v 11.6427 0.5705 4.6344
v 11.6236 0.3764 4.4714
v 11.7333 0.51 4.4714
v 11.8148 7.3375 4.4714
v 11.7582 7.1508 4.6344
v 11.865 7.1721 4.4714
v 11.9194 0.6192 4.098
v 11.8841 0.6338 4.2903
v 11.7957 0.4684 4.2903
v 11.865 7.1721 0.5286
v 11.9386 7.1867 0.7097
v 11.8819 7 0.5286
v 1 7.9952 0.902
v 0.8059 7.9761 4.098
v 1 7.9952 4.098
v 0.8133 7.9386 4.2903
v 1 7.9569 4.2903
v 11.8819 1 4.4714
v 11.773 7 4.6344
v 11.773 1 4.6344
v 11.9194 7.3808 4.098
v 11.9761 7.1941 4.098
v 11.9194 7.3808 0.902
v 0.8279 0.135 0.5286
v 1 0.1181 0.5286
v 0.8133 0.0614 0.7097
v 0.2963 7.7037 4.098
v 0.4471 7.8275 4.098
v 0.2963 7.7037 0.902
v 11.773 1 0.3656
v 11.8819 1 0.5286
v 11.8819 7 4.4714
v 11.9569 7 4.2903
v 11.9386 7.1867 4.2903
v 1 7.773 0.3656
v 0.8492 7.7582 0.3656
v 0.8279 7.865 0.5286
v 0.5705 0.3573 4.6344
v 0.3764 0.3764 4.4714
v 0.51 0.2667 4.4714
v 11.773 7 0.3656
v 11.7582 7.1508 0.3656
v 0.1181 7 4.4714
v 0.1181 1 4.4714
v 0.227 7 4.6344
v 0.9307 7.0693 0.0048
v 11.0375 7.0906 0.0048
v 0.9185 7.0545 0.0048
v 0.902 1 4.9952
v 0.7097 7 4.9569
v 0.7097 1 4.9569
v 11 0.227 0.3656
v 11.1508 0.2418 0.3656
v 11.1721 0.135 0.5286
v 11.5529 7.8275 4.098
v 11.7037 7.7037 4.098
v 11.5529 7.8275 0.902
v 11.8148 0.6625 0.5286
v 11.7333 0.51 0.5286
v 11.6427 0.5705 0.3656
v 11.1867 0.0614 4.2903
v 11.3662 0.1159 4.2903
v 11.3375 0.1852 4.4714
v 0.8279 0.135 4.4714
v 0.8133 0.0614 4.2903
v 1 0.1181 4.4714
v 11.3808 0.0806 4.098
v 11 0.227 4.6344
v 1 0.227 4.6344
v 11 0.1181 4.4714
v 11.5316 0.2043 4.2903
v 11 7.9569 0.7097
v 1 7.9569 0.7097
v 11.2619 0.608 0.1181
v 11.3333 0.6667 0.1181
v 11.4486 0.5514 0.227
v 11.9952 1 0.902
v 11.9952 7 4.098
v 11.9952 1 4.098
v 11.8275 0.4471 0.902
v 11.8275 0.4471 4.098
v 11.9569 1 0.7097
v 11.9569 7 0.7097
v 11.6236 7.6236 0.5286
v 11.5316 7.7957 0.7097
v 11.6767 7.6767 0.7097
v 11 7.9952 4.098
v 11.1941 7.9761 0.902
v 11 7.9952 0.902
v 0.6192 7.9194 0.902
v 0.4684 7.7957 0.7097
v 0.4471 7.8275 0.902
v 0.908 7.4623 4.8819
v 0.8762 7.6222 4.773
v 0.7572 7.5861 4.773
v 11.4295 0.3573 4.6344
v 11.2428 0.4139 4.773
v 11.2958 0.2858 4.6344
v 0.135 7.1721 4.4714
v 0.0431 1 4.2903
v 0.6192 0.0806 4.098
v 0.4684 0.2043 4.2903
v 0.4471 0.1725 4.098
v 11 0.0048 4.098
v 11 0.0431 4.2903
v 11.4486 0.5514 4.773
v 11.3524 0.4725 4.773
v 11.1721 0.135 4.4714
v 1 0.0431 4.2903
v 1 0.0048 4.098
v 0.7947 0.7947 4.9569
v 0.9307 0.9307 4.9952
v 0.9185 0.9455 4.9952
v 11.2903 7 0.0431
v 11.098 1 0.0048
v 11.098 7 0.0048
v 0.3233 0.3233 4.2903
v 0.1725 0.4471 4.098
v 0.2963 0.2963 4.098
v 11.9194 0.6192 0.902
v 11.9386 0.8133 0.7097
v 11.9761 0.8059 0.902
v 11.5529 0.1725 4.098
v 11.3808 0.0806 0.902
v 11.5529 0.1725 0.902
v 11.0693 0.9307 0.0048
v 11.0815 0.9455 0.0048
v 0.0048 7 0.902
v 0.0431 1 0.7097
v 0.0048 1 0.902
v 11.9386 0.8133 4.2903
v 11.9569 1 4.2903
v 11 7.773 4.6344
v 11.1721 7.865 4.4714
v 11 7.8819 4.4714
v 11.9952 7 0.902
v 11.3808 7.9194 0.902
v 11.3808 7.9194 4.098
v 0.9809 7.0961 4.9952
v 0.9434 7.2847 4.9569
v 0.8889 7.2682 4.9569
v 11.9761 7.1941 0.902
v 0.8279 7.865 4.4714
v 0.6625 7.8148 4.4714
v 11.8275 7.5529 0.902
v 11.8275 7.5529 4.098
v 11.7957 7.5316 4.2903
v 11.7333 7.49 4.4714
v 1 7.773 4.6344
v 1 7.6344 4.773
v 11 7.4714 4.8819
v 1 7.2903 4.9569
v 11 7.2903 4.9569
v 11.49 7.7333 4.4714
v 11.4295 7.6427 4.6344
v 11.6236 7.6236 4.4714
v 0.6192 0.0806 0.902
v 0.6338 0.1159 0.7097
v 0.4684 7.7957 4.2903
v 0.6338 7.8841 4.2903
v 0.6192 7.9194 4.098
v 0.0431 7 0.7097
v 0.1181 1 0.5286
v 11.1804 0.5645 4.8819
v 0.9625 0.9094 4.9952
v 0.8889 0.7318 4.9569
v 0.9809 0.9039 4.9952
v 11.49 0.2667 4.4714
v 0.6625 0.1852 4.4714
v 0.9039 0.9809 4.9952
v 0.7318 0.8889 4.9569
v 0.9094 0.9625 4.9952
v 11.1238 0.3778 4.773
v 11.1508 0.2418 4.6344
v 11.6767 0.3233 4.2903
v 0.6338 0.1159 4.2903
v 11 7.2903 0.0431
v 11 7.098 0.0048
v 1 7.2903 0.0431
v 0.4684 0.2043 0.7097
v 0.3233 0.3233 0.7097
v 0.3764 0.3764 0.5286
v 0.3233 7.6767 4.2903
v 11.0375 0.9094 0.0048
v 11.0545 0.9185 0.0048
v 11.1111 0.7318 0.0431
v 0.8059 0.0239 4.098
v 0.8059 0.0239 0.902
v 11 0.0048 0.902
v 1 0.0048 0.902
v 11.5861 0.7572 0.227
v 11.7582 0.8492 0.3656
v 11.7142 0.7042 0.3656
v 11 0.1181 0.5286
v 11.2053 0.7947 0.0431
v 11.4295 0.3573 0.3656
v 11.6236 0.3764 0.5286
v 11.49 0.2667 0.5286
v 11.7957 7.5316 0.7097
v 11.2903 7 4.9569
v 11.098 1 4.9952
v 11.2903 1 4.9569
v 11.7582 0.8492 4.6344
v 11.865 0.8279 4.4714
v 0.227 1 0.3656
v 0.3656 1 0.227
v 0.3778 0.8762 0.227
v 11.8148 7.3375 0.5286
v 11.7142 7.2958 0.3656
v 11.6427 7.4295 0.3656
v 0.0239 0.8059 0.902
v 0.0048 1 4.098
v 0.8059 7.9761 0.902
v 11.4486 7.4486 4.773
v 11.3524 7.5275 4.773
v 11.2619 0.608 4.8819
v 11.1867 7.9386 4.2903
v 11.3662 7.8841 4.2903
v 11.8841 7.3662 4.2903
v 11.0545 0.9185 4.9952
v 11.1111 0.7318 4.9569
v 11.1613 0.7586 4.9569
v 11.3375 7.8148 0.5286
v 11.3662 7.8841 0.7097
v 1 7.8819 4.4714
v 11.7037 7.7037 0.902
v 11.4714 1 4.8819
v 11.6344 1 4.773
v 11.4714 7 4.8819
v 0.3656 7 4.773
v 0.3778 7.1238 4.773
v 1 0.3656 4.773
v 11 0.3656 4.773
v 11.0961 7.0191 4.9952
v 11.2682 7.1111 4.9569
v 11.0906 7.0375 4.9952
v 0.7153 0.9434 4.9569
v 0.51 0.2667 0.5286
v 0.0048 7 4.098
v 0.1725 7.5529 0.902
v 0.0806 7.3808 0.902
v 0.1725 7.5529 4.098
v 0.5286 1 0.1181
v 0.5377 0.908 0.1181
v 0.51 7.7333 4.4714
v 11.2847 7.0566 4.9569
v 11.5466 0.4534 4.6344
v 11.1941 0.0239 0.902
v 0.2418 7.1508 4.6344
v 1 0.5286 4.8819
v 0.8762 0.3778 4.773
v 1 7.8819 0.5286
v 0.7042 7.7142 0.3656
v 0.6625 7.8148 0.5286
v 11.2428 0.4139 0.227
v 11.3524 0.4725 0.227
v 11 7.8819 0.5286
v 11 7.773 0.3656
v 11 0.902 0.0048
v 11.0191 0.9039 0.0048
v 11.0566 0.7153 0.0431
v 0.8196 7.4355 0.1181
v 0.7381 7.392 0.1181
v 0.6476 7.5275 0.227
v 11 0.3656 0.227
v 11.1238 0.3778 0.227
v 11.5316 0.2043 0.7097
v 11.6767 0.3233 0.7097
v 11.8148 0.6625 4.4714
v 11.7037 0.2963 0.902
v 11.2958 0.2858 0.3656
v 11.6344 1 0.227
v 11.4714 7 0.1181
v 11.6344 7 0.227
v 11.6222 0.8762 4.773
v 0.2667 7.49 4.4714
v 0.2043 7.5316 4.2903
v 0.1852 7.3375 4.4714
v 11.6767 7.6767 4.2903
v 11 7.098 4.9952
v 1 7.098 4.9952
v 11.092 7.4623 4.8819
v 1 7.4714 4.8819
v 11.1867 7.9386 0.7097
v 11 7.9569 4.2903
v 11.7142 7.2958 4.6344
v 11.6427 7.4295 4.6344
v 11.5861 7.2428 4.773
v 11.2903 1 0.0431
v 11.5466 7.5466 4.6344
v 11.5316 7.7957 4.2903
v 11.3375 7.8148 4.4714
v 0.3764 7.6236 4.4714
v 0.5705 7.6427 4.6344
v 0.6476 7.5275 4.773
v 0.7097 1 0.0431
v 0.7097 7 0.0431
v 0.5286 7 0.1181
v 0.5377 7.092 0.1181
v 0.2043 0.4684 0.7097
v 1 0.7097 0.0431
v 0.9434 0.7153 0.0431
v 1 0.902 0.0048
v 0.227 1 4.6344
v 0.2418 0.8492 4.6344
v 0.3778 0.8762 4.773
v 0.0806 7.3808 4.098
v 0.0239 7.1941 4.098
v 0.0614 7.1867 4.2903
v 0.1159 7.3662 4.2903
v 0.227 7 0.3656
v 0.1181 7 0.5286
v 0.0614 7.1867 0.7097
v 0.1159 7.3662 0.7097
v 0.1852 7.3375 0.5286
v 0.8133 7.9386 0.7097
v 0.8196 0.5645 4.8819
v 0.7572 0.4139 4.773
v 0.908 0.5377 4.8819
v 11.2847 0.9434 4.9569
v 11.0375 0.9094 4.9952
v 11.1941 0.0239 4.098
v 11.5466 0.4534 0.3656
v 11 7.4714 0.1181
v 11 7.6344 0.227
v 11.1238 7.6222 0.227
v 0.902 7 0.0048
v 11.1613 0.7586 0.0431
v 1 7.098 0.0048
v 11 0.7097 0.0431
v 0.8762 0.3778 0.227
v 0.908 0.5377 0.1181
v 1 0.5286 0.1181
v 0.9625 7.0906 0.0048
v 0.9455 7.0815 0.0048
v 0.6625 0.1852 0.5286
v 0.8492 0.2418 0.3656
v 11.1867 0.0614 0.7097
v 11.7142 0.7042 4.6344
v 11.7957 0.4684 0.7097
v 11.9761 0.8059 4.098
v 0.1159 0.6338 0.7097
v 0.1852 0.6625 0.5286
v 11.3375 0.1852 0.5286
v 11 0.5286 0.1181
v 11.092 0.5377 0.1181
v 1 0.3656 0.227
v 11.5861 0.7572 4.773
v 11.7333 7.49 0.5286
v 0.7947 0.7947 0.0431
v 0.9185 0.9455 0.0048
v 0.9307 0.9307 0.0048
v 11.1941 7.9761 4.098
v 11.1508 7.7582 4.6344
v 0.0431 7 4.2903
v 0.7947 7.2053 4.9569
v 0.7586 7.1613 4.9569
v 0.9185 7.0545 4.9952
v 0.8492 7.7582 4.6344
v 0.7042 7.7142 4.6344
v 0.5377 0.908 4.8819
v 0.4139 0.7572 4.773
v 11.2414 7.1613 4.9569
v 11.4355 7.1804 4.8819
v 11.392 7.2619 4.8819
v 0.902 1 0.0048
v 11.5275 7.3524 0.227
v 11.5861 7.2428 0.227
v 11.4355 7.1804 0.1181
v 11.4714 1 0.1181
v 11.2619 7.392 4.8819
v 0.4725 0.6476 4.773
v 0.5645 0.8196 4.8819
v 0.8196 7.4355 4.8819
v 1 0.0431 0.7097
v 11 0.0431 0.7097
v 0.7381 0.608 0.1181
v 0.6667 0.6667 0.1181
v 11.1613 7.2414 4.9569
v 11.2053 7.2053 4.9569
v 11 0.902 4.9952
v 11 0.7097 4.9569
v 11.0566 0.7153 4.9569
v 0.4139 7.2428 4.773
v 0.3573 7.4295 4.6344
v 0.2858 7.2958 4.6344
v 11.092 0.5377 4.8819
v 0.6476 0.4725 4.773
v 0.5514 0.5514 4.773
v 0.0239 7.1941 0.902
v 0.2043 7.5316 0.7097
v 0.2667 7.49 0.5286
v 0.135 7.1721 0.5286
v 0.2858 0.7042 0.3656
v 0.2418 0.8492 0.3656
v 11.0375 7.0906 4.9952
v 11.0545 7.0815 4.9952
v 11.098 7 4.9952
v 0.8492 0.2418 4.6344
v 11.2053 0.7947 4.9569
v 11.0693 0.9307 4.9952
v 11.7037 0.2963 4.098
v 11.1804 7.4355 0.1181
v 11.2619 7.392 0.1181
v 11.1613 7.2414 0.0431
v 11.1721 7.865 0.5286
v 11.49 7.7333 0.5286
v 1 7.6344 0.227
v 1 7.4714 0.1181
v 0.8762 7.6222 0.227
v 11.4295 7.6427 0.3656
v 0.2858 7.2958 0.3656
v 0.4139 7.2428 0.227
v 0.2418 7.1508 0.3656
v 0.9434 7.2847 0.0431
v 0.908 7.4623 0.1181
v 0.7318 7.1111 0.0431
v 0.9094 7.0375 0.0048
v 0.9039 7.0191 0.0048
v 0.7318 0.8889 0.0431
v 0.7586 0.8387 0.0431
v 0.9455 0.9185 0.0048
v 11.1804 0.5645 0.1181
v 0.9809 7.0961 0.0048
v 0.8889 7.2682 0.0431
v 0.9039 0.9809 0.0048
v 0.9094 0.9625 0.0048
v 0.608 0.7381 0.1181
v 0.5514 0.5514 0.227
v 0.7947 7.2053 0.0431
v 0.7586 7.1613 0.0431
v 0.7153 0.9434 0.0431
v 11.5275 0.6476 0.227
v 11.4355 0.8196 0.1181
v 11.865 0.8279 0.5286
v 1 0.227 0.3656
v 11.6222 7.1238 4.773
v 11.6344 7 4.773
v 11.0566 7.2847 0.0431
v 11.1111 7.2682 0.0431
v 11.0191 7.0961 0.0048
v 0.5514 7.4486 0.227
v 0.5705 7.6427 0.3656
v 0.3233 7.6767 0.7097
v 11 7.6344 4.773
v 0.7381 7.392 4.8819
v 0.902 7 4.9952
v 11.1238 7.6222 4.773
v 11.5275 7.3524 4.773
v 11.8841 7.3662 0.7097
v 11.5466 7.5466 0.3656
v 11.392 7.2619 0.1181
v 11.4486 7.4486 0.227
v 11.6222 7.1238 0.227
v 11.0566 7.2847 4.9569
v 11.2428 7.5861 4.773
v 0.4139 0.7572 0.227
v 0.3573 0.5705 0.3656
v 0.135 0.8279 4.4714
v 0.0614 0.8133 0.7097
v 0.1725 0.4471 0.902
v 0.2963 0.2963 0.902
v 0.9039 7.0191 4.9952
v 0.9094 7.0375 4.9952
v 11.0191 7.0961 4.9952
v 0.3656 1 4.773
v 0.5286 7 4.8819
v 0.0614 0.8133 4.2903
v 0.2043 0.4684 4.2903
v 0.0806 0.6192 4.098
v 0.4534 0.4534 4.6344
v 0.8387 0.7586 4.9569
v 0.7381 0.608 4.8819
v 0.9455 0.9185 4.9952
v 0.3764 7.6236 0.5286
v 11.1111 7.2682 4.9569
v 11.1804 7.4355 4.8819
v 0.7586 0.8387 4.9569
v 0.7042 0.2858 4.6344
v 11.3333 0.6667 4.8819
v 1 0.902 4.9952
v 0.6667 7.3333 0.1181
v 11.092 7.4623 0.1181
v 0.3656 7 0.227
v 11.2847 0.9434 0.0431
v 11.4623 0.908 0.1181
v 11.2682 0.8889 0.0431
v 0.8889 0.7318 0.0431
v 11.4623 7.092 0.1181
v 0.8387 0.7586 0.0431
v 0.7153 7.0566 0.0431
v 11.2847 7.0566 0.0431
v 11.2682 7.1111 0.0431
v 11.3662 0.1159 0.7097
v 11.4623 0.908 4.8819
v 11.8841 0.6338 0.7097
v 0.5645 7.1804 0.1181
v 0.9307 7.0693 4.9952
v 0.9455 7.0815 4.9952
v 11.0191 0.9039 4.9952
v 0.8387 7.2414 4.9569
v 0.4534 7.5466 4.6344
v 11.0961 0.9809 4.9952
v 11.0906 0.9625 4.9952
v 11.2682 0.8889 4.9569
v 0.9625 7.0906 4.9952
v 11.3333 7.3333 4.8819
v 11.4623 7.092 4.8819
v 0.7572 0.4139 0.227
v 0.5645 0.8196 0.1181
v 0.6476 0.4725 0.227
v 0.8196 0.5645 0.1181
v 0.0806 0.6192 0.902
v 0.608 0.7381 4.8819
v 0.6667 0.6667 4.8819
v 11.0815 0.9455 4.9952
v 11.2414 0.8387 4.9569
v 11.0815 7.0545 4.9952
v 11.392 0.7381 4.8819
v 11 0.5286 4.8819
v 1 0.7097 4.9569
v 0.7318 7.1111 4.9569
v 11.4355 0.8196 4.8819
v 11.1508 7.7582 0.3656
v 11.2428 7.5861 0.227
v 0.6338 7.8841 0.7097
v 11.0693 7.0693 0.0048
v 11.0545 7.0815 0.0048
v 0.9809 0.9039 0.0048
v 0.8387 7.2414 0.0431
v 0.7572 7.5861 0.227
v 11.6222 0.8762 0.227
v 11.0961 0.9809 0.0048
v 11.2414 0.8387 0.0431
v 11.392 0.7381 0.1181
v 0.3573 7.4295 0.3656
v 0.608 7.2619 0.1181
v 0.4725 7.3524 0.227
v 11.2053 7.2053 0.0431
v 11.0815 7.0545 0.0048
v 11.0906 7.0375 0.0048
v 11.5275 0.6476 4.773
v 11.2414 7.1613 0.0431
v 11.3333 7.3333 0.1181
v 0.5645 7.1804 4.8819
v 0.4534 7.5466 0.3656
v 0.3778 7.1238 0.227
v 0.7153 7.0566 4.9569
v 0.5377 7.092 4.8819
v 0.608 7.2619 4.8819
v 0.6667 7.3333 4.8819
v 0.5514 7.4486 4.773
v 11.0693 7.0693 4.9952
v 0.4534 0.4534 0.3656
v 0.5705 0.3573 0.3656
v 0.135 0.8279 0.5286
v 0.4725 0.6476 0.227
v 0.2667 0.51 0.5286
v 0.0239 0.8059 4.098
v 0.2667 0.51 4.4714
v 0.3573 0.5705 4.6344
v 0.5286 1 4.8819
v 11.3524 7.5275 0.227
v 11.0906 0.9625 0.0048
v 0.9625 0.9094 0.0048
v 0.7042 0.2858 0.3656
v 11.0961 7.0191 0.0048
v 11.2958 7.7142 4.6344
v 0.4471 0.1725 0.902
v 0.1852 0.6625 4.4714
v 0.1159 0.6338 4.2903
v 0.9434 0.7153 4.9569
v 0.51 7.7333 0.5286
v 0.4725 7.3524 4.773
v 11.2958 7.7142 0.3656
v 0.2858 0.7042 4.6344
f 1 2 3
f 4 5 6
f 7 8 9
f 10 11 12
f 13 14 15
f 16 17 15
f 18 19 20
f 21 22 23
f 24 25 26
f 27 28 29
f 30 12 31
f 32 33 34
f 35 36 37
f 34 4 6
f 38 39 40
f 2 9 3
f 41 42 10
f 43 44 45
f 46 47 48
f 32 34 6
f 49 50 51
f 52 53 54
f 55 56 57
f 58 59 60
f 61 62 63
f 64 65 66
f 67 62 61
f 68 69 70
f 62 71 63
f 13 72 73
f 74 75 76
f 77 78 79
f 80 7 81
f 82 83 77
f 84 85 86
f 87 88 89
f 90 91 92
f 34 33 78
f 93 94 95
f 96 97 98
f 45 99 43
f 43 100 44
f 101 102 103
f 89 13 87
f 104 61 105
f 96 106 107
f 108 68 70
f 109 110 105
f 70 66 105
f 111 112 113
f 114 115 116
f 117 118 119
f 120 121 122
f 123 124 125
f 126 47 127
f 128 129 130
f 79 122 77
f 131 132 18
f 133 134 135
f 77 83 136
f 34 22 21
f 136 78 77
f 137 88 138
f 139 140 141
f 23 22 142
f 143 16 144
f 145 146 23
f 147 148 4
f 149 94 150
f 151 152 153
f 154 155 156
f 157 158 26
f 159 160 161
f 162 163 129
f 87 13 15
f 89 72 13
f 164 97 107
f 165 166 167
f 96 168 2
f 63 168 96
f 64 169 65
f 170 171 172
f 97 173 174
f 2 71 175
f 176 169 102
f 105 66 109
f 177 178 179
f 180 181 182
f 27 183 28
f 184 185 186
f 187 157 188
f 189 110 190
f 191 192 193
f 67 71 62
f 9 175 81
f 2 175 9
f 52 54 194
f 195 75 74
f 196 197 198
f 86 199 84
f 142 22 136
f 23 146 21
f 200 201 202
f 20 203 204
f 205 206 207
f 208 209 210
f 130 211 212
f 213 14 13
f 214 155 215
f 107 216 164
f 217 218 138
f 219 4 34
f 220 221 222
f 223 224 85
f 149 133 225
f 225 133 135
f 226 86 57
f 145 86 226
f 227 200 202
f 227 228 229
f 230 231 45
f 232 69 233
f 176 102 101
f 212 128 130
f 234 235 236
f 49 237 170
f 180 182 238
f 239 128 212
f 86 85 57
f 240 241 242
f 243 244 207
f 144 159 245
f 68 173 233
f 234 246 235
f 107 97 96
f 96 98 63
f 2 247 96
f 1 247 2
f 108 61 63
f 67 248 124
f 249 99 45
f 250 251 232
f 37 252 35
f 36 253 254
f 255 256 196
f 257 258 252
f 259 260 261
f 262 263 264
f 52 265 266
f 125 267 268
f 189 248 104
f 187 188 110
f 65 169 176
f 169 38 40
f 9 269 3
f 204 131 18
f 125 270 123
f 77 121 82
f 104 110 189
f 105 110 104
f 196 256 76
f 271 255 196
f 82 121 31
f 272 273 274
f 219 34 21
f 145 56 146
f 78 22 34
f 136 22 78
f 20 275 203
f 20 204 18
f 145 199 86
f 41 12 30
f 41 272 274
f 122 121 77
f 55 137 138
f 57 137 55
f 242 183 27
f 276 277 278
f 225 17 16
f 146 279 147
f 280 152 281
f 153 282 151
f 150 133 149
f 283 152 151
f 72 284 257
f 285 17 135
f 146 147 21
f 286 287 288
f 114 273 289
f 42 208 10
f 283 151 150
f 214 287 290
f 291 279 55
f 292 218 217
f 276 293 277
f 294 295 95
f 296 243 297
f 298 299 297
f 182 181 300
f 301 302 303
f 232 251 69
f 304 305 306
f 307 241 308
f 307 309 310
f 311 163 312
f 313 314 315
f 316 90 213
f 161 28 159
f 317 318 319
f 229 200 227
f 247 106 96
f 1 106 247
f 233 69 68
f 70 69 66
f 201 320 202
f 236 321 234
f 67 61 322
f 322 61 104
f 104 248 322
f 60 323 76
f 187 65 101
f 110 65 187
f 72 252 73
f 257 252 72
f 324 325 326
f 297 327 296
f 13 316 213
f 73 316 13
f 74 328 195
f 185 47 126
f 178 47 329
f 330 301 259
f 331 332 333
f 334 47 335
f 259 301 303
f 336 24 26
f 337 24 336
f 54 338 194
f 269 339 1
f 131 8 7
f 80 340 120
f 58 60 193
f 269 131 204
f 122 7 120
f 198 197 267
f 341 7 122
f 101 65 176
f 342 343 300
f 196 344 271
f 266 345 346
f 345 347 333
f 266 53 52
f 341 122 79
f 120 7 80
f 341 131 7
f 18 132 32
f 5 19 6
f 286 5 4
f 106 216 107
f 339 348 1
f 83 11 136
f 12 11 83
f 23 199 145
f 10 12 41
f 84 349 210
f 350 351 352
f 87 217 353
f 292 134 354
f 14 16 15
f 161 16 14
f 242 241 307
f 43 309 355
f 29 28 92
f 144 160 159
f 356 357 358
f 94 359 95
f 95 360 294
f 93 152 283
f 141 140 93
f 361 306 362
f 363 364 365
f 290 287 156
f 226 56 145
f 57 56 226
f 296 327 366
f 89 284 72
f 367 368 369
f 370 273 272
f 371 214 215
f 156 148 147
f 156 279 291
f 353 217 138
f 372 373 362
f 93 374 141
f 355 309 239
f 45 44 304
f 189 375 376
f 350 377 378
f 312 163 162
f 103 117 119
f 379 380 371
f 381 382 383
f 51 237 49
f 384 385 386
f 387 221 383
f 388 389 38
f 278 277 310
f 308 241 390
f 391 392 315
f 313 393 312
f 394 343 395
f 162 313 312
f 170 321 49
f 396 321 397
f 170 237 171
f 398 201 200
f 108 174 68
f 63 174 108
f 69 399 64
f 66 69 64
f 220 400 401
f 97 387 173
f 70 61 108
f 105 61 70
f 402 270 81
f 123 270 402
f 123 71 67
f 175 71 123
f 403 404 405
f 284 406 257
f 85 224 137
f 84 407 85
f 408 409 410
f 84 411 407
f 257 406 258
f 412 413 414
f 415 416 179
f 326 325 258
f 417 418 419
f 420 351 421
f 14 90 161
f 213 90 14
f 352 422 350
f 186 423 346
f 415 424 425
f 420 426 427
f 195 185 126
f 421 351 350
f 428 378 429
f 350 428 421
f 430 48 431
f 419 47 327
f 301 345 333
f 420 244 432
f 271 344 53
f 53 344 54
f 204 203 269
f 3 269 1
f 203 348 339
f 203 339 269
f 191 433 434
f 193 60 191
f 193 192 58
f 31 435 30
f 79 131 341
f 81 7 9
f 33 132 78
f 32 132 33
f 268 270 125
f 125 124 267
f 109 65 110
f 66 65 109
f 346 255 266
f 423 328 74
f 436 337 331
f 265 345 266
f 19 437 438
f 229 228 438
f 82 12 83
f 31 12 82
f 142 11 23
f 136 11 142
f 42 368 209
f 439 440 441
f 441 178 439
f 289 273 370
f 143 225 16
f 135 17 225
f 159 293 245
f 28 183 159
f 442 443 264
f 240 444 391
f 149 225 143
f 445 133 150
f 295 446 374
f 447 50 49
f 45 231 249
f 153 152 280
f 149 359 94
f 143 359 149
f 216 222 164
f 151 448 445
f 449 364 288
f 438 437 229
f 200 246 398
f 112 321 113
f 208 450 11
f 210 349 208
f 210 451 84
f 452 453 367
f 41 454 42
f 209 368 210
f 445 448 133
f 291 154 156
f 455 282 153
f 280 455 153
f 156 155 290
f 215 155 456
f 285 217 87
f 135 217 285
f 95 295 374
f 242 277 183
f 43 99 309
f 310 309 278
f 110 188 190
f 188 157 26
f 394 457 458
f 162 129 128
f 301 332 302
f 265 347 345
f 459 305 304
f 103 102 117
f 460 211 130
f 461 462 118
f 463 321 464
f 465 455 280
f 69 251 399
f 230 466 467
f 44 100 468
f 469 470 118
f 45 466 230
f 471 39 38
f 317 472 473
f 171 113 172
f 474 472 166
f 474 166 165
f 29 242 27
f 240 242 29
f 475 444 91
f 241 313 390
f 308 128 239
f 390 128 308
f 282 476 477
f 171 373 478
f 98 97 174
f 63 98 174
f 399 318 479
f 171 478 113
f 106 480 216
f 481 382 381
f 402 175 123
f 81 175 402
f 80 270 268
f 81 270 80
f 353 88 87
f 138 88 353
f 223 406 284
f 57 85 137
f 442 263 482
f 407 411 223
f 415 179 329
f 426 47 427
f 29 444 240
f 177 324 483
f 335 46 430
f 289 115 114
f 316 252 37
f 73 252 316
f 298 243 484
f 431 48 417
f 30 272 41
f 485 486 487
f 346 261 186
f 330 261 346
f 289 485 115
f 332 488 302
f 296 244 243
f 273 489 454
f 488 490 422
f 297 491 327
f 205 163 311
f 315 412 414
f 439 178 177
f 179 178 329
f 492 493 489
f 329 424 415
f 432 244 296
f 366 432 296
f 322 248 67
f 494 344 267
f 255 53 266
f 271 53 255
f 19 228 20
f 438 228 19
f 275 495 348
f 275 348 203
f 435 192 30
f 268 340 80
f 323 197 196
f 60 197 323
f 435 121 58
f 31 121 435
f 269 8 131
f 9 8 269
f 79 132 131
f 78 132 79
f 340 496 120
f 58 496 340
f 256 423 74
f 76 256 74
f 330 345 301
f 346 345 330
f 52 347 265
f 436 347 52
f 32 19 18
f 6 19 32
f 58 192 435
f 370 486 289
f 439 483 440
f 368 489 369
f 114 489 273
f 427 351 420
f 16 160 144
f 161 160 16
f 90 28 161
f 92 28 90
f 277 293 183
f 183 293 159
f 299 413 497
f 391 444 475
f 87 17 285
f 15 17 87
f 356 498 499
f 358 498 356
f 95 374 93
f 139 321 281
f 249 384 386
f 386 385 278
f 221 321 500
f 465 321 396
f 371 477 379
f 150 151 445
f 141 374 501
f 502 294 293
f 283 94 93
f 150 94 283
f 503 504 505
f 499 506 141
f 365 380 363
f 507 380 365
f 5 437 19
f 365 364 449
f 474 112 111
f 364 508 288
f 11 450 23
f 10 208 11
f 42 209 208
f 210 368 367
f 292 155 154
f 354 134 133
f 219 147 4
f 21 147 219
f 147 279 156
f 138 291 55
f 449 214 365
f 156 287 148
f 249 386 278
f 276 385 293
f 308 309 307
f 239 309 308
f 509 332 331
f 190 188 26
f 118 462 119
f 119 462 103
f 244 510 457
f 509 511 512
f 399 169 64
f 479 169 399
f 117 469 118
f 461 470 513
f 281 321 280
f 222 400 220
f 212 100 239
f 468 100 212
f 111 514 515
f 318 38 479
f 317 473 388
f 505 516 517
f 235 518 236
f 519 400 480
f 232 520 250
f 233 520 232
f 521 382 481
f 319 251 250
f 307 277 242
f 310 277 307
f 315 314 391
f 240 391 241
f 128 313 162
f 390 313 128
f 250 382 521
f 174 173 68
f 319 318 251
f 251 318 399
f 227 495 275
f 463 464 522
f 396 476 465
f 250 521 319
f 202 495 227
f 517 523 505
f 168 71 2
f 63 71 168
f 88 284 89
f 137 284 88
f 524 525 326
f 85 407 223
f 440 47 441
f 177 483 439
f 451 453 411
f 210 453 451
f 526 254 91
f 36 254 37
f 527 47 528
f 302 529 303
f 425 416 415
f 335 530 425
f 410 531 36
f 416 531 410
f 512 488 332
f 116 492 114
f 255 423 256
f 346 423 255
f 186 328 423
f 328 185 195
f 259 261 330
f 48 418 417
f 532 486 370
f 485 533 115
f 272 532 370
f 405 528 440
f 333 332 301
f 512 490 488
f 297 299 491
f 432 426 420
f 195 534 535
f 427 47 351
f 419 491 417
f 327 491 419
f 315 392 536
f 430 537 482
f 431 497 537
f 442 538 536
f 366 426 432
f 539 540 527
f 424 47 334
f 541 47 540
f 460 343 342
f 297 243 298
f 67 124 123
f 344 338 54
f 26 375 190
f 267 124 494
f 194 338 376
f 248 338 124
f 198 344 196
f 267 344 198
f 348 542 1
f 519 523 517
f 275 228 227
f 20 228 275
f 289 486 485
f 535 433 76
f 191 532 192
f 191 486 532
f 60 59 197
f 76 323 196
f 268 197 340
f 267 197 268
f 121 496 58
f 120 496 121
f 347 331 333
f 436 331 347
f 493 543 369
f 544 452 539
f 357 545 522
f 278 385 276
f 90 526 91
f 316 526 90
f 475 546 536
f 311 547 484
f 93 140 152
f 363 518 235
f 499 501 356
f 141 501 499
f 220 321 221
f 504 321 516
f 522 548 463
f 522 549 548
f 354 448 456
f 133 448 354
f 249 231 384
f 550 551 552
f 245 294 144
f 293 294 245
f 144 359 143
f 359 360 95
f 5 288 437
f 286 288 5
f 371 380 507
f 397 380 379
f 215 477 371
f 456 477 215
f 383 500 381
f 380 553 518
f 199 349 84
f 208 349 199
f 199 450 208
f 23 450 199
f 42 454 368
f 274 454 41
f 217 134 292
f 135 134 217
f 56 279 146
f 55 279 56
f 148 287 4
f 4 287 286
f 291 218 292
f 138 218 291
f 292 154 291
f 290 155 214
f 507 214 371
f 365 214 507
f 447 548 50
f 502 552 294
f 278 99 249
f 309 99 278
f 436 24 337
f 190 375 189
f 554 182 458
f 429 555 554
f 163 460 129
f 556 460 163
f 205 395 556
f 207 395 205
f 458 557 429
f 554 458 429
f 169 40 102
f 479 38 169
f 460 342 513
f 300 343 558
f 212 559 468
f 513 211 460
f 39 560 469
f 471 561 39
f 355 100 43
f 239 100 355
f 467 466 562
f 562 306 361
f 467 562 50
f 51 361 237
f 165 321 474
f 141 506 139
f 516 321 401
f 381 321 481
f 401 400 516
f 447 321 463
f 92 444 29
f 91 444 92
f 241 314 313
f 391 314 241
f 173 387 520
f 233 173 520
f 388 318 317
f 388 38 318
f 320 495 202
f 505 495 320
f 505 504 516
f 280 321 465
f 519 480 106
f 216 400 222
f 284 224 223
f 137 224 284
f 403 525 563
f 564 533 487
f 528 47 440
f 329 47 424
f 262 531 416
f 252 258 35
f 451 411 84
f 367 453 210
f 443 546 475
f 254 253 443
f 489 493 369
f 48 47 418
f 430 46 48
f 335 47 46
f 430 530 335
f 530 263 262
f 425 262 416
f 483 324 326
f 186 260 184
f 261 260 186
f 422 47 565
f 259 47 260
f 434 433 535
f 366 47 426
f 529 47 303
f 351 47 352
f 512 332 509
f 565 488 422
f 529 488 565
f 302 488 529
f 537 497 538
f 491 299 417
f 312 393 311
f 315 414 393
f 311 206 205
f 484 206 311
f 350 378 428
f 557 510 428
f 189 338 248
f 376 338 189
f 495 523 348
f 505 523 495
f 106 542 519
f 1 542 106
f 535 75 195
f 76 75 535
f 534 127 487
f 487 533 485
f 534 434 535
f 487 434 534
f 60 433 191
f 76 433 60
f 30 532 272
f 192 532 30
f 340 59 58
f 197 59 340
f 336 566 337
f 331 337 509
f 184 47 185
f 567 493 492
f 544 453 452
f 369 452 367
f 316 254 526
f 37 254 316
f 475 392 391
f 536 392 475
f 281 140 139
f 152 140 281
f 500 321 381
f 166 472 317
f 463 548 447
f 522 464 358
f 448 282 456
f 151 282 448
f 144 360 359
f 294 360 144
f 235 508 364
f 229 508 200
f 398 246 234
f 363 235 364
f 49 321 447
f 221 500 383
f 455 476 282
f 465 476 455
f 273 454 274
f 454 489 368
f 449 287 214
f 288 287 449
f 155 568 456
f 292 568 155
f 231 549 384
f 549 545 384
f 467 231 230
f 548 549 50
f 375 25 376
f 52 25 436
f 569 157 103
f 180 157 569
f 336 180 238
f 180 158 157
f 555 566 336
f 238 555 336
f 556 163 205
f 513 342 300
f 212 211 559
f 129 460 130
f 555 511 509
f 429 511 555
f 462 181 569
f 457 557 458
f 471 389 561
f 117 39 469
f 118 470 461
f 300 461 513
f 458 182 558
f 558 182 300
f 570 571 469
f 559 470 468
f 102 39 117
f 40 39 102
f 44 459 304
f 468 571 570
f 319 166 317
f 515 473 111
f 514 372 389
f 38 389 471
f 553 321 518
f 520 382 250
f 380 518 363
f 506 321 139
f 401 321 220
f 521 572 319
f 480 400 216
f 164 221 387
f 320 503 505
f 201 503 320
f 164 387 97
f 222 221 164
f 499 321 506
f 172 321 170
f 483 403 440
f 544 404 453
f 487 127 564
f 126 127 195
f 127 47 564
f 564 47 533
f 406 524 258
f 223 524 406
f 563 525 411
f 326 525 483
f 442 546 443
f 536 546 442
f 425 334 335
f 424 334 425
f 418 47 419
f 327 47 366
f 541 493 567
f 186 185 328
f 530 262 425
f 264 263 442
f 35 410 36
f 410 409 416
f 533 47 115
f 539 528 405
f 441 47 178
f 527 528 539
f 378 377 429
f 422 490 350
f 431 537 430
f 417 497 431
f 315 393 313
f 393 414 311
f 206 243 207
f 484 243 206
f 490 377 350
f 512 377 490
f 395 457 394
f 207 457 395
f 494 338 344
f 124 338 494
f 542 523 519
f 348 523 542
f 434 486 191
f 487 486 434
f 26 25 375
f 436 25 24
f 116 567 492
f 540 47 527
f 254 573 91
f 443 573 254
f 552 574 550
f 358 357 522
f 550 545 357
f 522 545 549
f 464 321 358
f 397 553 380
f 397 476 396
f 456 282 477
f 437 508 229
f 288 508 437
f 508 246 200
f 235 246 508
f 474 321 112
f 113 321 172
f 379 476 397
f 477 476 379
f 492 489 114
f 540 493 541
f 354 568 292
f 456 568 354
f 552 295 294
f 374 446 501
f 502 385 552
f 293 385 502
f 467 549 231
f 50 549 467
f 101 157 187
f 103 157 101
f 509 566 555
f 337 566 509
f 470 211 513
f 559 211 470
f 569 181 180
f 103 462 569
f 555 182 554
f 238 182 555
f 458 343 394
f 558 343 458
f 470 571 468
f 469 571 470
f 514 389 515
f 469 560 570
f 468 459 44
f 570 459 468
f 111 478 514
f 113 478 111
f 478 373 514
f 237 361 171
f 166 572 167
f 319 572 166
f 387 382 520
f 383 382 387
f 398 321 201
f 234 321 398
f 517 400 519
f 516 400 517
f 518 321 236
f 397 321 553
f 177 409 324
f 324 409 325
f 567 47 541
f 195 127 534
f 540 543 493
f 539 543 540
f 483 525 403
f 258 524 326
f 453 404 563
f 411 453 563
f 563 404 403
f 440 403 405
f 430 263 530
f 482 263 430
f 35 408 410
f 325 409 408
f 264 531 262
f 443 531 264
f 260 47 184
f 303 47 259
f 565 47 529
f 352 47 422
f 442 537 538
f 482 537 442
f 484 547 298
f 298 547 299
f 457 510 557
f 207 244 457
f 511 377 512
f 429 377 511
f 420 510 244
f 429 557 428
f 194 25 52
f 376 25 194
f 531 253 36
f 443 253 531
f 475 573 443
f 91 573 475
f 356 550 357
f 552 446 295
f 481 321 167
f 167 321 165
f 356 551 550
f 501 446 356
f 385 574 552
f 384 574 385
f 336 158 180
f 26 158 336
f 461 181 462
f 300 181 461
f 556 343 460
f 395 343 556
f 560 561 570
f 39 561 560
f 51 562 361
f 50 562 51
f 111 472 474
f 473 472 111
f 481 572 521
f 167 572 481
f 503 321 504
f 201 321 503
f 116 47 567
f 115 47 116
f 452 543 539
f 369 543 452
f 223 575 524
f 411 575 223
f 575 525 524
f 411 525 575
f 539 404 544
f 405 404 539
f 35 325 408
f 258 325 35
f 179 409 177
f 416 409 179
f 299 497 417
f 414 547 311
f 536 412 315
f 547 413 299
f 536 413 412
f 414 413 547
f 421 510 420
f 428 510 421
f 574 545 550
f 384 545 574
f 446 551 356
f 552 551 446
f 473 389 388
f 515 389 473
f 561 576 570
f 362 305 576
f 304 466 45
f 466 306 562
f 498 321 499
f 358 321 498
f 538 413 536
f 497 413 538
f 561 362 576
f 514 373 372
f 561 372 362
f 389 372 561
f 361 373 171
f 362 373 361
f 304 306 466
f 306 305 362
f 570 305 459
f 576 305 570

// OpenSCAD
block_width = 12;
block_depth = 8;
block_height = 5;
corner_radius = 1;
$fn = 32;

module rounded_cube(size, radius) {
    translate([radius, radius, radius]) {
        minkowski() {
            cube([
                size[0] - (2 * radius),
                size[1] - (2 * radius),
                size[2] - (2 * radius)
            ]);
            sphere(r = radius);
        }
    }
}

rounded_cube([block_width, block_depth, block_height], corner_radius);
